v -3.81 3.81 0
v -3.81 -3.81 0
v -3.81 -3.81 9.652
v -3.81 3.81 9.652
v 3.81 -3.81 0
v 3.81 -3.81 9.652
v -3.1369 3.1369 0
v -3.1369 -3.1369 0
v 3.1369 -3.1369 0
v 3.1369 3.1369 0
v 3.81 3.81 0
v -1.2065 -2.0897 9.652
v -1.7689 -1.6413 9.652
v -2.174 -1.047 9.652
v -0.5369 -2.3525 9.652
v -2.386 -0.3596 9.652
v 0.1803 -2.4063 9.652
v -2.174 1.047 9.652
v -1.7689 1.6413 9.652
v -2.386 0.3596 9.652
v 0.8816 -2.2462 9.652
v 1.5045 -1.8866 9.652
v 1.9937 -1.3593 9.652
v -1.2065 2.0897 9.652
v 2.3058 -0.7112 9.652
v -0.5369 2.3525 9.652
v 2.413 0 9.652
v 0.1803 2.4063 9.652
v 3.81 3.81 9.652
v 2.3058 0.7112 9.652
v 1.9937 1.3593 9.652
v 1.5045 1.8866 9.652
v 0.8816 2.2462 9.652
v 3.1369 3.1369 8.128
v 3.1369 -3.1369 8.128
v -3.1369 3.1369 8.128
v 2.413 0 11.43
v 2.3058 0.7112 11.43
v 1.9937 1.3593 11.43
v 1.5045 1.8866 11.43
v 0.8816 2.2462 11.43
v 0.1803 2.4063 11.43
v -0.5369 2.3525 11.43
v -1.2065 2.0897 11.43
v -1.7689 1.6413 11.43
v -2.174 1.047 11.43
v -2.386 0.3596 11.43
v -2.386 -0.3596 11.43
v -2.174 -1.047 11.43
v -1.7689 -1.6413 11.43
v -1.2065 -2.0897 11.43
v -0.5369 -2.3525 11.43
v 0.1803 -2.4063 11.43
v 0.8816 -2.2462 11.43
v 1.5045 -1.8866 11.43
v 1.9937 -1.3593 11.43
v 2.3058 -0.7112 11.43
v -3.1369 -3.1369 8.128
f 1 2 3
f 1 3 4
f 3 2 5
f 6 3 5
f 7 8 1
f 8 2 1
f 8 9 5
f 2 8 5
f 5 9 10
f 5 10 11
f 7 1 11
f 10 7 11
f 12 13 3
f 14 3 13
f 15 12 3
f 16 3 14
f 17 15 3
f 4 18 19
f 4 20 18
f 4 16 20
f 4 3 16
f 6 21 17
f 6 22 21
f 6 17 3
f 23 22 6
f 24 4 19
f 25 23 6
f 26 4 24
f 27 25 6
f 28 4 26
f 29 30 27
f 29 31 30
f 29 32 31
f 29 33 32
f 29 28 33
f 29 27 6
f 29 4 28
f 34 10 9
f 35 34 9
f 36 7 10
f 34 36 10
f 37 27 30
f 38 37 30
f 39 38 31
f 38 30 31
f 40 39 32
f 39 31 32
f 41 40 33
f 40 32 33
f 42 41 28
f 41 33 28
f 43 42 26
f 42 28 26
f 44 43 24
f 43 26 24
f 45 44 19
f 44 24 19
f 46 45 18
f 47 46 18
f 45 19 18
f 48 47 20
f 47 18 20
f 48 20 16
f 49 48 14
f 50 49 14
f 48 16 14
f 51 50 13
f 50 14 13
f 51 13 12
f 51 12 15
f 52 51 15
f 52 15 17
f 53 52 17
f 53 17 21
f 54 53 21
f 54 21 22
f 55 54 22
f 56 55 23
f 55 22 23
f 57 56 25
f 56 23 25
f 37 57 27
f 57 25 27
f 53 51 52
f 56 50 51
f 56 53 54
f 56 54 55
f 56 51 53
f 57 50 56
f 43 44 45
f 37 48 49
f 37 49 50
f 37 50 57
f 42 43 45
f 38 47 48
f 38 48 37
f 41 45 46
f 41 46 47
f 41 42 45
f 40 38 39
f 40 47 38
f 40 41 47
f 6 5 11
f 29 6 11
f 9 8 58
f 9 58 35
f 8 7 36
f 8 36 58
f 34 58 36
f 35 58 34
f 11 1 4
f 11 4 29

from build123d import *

# Parameters (mm, degrees)
F0_W     = 7.62
F0_H     = 7.62
F1_DEPTH = 9.652
F2_R     = 2.413
F3_DEPTH = 1.778
F4_W     = 6.2738
F4_H     = 6.2738
F5_DEPTH = 8.128


with BuildPart() as f1:
    # F0 (on Top) → F1 (new body)
    with BuildSketch(Plane.XY):
        Rectangle(F0_W, F0_H)
    extrude(amount=F1_DEPTH)

    # F2 (on face) → F3 (join)
    with BuildSketch(Plane.XY.offset(9.652)):
        Circle(F2_R)
    extrude(amount=F3_DEPTH)

    # F4 (on face) → F5 (cut)
    with BuildSketch(Plane(origin=(0, 0, 0), x_dir=(1, 0, 0), z_dir=(0, 0, -1))):
        Rectangle(F4_W, F4_H)
    extrude(amount=-F5_DEPTH, mode=Mode.SUBTRACT)


solid = f1.part
